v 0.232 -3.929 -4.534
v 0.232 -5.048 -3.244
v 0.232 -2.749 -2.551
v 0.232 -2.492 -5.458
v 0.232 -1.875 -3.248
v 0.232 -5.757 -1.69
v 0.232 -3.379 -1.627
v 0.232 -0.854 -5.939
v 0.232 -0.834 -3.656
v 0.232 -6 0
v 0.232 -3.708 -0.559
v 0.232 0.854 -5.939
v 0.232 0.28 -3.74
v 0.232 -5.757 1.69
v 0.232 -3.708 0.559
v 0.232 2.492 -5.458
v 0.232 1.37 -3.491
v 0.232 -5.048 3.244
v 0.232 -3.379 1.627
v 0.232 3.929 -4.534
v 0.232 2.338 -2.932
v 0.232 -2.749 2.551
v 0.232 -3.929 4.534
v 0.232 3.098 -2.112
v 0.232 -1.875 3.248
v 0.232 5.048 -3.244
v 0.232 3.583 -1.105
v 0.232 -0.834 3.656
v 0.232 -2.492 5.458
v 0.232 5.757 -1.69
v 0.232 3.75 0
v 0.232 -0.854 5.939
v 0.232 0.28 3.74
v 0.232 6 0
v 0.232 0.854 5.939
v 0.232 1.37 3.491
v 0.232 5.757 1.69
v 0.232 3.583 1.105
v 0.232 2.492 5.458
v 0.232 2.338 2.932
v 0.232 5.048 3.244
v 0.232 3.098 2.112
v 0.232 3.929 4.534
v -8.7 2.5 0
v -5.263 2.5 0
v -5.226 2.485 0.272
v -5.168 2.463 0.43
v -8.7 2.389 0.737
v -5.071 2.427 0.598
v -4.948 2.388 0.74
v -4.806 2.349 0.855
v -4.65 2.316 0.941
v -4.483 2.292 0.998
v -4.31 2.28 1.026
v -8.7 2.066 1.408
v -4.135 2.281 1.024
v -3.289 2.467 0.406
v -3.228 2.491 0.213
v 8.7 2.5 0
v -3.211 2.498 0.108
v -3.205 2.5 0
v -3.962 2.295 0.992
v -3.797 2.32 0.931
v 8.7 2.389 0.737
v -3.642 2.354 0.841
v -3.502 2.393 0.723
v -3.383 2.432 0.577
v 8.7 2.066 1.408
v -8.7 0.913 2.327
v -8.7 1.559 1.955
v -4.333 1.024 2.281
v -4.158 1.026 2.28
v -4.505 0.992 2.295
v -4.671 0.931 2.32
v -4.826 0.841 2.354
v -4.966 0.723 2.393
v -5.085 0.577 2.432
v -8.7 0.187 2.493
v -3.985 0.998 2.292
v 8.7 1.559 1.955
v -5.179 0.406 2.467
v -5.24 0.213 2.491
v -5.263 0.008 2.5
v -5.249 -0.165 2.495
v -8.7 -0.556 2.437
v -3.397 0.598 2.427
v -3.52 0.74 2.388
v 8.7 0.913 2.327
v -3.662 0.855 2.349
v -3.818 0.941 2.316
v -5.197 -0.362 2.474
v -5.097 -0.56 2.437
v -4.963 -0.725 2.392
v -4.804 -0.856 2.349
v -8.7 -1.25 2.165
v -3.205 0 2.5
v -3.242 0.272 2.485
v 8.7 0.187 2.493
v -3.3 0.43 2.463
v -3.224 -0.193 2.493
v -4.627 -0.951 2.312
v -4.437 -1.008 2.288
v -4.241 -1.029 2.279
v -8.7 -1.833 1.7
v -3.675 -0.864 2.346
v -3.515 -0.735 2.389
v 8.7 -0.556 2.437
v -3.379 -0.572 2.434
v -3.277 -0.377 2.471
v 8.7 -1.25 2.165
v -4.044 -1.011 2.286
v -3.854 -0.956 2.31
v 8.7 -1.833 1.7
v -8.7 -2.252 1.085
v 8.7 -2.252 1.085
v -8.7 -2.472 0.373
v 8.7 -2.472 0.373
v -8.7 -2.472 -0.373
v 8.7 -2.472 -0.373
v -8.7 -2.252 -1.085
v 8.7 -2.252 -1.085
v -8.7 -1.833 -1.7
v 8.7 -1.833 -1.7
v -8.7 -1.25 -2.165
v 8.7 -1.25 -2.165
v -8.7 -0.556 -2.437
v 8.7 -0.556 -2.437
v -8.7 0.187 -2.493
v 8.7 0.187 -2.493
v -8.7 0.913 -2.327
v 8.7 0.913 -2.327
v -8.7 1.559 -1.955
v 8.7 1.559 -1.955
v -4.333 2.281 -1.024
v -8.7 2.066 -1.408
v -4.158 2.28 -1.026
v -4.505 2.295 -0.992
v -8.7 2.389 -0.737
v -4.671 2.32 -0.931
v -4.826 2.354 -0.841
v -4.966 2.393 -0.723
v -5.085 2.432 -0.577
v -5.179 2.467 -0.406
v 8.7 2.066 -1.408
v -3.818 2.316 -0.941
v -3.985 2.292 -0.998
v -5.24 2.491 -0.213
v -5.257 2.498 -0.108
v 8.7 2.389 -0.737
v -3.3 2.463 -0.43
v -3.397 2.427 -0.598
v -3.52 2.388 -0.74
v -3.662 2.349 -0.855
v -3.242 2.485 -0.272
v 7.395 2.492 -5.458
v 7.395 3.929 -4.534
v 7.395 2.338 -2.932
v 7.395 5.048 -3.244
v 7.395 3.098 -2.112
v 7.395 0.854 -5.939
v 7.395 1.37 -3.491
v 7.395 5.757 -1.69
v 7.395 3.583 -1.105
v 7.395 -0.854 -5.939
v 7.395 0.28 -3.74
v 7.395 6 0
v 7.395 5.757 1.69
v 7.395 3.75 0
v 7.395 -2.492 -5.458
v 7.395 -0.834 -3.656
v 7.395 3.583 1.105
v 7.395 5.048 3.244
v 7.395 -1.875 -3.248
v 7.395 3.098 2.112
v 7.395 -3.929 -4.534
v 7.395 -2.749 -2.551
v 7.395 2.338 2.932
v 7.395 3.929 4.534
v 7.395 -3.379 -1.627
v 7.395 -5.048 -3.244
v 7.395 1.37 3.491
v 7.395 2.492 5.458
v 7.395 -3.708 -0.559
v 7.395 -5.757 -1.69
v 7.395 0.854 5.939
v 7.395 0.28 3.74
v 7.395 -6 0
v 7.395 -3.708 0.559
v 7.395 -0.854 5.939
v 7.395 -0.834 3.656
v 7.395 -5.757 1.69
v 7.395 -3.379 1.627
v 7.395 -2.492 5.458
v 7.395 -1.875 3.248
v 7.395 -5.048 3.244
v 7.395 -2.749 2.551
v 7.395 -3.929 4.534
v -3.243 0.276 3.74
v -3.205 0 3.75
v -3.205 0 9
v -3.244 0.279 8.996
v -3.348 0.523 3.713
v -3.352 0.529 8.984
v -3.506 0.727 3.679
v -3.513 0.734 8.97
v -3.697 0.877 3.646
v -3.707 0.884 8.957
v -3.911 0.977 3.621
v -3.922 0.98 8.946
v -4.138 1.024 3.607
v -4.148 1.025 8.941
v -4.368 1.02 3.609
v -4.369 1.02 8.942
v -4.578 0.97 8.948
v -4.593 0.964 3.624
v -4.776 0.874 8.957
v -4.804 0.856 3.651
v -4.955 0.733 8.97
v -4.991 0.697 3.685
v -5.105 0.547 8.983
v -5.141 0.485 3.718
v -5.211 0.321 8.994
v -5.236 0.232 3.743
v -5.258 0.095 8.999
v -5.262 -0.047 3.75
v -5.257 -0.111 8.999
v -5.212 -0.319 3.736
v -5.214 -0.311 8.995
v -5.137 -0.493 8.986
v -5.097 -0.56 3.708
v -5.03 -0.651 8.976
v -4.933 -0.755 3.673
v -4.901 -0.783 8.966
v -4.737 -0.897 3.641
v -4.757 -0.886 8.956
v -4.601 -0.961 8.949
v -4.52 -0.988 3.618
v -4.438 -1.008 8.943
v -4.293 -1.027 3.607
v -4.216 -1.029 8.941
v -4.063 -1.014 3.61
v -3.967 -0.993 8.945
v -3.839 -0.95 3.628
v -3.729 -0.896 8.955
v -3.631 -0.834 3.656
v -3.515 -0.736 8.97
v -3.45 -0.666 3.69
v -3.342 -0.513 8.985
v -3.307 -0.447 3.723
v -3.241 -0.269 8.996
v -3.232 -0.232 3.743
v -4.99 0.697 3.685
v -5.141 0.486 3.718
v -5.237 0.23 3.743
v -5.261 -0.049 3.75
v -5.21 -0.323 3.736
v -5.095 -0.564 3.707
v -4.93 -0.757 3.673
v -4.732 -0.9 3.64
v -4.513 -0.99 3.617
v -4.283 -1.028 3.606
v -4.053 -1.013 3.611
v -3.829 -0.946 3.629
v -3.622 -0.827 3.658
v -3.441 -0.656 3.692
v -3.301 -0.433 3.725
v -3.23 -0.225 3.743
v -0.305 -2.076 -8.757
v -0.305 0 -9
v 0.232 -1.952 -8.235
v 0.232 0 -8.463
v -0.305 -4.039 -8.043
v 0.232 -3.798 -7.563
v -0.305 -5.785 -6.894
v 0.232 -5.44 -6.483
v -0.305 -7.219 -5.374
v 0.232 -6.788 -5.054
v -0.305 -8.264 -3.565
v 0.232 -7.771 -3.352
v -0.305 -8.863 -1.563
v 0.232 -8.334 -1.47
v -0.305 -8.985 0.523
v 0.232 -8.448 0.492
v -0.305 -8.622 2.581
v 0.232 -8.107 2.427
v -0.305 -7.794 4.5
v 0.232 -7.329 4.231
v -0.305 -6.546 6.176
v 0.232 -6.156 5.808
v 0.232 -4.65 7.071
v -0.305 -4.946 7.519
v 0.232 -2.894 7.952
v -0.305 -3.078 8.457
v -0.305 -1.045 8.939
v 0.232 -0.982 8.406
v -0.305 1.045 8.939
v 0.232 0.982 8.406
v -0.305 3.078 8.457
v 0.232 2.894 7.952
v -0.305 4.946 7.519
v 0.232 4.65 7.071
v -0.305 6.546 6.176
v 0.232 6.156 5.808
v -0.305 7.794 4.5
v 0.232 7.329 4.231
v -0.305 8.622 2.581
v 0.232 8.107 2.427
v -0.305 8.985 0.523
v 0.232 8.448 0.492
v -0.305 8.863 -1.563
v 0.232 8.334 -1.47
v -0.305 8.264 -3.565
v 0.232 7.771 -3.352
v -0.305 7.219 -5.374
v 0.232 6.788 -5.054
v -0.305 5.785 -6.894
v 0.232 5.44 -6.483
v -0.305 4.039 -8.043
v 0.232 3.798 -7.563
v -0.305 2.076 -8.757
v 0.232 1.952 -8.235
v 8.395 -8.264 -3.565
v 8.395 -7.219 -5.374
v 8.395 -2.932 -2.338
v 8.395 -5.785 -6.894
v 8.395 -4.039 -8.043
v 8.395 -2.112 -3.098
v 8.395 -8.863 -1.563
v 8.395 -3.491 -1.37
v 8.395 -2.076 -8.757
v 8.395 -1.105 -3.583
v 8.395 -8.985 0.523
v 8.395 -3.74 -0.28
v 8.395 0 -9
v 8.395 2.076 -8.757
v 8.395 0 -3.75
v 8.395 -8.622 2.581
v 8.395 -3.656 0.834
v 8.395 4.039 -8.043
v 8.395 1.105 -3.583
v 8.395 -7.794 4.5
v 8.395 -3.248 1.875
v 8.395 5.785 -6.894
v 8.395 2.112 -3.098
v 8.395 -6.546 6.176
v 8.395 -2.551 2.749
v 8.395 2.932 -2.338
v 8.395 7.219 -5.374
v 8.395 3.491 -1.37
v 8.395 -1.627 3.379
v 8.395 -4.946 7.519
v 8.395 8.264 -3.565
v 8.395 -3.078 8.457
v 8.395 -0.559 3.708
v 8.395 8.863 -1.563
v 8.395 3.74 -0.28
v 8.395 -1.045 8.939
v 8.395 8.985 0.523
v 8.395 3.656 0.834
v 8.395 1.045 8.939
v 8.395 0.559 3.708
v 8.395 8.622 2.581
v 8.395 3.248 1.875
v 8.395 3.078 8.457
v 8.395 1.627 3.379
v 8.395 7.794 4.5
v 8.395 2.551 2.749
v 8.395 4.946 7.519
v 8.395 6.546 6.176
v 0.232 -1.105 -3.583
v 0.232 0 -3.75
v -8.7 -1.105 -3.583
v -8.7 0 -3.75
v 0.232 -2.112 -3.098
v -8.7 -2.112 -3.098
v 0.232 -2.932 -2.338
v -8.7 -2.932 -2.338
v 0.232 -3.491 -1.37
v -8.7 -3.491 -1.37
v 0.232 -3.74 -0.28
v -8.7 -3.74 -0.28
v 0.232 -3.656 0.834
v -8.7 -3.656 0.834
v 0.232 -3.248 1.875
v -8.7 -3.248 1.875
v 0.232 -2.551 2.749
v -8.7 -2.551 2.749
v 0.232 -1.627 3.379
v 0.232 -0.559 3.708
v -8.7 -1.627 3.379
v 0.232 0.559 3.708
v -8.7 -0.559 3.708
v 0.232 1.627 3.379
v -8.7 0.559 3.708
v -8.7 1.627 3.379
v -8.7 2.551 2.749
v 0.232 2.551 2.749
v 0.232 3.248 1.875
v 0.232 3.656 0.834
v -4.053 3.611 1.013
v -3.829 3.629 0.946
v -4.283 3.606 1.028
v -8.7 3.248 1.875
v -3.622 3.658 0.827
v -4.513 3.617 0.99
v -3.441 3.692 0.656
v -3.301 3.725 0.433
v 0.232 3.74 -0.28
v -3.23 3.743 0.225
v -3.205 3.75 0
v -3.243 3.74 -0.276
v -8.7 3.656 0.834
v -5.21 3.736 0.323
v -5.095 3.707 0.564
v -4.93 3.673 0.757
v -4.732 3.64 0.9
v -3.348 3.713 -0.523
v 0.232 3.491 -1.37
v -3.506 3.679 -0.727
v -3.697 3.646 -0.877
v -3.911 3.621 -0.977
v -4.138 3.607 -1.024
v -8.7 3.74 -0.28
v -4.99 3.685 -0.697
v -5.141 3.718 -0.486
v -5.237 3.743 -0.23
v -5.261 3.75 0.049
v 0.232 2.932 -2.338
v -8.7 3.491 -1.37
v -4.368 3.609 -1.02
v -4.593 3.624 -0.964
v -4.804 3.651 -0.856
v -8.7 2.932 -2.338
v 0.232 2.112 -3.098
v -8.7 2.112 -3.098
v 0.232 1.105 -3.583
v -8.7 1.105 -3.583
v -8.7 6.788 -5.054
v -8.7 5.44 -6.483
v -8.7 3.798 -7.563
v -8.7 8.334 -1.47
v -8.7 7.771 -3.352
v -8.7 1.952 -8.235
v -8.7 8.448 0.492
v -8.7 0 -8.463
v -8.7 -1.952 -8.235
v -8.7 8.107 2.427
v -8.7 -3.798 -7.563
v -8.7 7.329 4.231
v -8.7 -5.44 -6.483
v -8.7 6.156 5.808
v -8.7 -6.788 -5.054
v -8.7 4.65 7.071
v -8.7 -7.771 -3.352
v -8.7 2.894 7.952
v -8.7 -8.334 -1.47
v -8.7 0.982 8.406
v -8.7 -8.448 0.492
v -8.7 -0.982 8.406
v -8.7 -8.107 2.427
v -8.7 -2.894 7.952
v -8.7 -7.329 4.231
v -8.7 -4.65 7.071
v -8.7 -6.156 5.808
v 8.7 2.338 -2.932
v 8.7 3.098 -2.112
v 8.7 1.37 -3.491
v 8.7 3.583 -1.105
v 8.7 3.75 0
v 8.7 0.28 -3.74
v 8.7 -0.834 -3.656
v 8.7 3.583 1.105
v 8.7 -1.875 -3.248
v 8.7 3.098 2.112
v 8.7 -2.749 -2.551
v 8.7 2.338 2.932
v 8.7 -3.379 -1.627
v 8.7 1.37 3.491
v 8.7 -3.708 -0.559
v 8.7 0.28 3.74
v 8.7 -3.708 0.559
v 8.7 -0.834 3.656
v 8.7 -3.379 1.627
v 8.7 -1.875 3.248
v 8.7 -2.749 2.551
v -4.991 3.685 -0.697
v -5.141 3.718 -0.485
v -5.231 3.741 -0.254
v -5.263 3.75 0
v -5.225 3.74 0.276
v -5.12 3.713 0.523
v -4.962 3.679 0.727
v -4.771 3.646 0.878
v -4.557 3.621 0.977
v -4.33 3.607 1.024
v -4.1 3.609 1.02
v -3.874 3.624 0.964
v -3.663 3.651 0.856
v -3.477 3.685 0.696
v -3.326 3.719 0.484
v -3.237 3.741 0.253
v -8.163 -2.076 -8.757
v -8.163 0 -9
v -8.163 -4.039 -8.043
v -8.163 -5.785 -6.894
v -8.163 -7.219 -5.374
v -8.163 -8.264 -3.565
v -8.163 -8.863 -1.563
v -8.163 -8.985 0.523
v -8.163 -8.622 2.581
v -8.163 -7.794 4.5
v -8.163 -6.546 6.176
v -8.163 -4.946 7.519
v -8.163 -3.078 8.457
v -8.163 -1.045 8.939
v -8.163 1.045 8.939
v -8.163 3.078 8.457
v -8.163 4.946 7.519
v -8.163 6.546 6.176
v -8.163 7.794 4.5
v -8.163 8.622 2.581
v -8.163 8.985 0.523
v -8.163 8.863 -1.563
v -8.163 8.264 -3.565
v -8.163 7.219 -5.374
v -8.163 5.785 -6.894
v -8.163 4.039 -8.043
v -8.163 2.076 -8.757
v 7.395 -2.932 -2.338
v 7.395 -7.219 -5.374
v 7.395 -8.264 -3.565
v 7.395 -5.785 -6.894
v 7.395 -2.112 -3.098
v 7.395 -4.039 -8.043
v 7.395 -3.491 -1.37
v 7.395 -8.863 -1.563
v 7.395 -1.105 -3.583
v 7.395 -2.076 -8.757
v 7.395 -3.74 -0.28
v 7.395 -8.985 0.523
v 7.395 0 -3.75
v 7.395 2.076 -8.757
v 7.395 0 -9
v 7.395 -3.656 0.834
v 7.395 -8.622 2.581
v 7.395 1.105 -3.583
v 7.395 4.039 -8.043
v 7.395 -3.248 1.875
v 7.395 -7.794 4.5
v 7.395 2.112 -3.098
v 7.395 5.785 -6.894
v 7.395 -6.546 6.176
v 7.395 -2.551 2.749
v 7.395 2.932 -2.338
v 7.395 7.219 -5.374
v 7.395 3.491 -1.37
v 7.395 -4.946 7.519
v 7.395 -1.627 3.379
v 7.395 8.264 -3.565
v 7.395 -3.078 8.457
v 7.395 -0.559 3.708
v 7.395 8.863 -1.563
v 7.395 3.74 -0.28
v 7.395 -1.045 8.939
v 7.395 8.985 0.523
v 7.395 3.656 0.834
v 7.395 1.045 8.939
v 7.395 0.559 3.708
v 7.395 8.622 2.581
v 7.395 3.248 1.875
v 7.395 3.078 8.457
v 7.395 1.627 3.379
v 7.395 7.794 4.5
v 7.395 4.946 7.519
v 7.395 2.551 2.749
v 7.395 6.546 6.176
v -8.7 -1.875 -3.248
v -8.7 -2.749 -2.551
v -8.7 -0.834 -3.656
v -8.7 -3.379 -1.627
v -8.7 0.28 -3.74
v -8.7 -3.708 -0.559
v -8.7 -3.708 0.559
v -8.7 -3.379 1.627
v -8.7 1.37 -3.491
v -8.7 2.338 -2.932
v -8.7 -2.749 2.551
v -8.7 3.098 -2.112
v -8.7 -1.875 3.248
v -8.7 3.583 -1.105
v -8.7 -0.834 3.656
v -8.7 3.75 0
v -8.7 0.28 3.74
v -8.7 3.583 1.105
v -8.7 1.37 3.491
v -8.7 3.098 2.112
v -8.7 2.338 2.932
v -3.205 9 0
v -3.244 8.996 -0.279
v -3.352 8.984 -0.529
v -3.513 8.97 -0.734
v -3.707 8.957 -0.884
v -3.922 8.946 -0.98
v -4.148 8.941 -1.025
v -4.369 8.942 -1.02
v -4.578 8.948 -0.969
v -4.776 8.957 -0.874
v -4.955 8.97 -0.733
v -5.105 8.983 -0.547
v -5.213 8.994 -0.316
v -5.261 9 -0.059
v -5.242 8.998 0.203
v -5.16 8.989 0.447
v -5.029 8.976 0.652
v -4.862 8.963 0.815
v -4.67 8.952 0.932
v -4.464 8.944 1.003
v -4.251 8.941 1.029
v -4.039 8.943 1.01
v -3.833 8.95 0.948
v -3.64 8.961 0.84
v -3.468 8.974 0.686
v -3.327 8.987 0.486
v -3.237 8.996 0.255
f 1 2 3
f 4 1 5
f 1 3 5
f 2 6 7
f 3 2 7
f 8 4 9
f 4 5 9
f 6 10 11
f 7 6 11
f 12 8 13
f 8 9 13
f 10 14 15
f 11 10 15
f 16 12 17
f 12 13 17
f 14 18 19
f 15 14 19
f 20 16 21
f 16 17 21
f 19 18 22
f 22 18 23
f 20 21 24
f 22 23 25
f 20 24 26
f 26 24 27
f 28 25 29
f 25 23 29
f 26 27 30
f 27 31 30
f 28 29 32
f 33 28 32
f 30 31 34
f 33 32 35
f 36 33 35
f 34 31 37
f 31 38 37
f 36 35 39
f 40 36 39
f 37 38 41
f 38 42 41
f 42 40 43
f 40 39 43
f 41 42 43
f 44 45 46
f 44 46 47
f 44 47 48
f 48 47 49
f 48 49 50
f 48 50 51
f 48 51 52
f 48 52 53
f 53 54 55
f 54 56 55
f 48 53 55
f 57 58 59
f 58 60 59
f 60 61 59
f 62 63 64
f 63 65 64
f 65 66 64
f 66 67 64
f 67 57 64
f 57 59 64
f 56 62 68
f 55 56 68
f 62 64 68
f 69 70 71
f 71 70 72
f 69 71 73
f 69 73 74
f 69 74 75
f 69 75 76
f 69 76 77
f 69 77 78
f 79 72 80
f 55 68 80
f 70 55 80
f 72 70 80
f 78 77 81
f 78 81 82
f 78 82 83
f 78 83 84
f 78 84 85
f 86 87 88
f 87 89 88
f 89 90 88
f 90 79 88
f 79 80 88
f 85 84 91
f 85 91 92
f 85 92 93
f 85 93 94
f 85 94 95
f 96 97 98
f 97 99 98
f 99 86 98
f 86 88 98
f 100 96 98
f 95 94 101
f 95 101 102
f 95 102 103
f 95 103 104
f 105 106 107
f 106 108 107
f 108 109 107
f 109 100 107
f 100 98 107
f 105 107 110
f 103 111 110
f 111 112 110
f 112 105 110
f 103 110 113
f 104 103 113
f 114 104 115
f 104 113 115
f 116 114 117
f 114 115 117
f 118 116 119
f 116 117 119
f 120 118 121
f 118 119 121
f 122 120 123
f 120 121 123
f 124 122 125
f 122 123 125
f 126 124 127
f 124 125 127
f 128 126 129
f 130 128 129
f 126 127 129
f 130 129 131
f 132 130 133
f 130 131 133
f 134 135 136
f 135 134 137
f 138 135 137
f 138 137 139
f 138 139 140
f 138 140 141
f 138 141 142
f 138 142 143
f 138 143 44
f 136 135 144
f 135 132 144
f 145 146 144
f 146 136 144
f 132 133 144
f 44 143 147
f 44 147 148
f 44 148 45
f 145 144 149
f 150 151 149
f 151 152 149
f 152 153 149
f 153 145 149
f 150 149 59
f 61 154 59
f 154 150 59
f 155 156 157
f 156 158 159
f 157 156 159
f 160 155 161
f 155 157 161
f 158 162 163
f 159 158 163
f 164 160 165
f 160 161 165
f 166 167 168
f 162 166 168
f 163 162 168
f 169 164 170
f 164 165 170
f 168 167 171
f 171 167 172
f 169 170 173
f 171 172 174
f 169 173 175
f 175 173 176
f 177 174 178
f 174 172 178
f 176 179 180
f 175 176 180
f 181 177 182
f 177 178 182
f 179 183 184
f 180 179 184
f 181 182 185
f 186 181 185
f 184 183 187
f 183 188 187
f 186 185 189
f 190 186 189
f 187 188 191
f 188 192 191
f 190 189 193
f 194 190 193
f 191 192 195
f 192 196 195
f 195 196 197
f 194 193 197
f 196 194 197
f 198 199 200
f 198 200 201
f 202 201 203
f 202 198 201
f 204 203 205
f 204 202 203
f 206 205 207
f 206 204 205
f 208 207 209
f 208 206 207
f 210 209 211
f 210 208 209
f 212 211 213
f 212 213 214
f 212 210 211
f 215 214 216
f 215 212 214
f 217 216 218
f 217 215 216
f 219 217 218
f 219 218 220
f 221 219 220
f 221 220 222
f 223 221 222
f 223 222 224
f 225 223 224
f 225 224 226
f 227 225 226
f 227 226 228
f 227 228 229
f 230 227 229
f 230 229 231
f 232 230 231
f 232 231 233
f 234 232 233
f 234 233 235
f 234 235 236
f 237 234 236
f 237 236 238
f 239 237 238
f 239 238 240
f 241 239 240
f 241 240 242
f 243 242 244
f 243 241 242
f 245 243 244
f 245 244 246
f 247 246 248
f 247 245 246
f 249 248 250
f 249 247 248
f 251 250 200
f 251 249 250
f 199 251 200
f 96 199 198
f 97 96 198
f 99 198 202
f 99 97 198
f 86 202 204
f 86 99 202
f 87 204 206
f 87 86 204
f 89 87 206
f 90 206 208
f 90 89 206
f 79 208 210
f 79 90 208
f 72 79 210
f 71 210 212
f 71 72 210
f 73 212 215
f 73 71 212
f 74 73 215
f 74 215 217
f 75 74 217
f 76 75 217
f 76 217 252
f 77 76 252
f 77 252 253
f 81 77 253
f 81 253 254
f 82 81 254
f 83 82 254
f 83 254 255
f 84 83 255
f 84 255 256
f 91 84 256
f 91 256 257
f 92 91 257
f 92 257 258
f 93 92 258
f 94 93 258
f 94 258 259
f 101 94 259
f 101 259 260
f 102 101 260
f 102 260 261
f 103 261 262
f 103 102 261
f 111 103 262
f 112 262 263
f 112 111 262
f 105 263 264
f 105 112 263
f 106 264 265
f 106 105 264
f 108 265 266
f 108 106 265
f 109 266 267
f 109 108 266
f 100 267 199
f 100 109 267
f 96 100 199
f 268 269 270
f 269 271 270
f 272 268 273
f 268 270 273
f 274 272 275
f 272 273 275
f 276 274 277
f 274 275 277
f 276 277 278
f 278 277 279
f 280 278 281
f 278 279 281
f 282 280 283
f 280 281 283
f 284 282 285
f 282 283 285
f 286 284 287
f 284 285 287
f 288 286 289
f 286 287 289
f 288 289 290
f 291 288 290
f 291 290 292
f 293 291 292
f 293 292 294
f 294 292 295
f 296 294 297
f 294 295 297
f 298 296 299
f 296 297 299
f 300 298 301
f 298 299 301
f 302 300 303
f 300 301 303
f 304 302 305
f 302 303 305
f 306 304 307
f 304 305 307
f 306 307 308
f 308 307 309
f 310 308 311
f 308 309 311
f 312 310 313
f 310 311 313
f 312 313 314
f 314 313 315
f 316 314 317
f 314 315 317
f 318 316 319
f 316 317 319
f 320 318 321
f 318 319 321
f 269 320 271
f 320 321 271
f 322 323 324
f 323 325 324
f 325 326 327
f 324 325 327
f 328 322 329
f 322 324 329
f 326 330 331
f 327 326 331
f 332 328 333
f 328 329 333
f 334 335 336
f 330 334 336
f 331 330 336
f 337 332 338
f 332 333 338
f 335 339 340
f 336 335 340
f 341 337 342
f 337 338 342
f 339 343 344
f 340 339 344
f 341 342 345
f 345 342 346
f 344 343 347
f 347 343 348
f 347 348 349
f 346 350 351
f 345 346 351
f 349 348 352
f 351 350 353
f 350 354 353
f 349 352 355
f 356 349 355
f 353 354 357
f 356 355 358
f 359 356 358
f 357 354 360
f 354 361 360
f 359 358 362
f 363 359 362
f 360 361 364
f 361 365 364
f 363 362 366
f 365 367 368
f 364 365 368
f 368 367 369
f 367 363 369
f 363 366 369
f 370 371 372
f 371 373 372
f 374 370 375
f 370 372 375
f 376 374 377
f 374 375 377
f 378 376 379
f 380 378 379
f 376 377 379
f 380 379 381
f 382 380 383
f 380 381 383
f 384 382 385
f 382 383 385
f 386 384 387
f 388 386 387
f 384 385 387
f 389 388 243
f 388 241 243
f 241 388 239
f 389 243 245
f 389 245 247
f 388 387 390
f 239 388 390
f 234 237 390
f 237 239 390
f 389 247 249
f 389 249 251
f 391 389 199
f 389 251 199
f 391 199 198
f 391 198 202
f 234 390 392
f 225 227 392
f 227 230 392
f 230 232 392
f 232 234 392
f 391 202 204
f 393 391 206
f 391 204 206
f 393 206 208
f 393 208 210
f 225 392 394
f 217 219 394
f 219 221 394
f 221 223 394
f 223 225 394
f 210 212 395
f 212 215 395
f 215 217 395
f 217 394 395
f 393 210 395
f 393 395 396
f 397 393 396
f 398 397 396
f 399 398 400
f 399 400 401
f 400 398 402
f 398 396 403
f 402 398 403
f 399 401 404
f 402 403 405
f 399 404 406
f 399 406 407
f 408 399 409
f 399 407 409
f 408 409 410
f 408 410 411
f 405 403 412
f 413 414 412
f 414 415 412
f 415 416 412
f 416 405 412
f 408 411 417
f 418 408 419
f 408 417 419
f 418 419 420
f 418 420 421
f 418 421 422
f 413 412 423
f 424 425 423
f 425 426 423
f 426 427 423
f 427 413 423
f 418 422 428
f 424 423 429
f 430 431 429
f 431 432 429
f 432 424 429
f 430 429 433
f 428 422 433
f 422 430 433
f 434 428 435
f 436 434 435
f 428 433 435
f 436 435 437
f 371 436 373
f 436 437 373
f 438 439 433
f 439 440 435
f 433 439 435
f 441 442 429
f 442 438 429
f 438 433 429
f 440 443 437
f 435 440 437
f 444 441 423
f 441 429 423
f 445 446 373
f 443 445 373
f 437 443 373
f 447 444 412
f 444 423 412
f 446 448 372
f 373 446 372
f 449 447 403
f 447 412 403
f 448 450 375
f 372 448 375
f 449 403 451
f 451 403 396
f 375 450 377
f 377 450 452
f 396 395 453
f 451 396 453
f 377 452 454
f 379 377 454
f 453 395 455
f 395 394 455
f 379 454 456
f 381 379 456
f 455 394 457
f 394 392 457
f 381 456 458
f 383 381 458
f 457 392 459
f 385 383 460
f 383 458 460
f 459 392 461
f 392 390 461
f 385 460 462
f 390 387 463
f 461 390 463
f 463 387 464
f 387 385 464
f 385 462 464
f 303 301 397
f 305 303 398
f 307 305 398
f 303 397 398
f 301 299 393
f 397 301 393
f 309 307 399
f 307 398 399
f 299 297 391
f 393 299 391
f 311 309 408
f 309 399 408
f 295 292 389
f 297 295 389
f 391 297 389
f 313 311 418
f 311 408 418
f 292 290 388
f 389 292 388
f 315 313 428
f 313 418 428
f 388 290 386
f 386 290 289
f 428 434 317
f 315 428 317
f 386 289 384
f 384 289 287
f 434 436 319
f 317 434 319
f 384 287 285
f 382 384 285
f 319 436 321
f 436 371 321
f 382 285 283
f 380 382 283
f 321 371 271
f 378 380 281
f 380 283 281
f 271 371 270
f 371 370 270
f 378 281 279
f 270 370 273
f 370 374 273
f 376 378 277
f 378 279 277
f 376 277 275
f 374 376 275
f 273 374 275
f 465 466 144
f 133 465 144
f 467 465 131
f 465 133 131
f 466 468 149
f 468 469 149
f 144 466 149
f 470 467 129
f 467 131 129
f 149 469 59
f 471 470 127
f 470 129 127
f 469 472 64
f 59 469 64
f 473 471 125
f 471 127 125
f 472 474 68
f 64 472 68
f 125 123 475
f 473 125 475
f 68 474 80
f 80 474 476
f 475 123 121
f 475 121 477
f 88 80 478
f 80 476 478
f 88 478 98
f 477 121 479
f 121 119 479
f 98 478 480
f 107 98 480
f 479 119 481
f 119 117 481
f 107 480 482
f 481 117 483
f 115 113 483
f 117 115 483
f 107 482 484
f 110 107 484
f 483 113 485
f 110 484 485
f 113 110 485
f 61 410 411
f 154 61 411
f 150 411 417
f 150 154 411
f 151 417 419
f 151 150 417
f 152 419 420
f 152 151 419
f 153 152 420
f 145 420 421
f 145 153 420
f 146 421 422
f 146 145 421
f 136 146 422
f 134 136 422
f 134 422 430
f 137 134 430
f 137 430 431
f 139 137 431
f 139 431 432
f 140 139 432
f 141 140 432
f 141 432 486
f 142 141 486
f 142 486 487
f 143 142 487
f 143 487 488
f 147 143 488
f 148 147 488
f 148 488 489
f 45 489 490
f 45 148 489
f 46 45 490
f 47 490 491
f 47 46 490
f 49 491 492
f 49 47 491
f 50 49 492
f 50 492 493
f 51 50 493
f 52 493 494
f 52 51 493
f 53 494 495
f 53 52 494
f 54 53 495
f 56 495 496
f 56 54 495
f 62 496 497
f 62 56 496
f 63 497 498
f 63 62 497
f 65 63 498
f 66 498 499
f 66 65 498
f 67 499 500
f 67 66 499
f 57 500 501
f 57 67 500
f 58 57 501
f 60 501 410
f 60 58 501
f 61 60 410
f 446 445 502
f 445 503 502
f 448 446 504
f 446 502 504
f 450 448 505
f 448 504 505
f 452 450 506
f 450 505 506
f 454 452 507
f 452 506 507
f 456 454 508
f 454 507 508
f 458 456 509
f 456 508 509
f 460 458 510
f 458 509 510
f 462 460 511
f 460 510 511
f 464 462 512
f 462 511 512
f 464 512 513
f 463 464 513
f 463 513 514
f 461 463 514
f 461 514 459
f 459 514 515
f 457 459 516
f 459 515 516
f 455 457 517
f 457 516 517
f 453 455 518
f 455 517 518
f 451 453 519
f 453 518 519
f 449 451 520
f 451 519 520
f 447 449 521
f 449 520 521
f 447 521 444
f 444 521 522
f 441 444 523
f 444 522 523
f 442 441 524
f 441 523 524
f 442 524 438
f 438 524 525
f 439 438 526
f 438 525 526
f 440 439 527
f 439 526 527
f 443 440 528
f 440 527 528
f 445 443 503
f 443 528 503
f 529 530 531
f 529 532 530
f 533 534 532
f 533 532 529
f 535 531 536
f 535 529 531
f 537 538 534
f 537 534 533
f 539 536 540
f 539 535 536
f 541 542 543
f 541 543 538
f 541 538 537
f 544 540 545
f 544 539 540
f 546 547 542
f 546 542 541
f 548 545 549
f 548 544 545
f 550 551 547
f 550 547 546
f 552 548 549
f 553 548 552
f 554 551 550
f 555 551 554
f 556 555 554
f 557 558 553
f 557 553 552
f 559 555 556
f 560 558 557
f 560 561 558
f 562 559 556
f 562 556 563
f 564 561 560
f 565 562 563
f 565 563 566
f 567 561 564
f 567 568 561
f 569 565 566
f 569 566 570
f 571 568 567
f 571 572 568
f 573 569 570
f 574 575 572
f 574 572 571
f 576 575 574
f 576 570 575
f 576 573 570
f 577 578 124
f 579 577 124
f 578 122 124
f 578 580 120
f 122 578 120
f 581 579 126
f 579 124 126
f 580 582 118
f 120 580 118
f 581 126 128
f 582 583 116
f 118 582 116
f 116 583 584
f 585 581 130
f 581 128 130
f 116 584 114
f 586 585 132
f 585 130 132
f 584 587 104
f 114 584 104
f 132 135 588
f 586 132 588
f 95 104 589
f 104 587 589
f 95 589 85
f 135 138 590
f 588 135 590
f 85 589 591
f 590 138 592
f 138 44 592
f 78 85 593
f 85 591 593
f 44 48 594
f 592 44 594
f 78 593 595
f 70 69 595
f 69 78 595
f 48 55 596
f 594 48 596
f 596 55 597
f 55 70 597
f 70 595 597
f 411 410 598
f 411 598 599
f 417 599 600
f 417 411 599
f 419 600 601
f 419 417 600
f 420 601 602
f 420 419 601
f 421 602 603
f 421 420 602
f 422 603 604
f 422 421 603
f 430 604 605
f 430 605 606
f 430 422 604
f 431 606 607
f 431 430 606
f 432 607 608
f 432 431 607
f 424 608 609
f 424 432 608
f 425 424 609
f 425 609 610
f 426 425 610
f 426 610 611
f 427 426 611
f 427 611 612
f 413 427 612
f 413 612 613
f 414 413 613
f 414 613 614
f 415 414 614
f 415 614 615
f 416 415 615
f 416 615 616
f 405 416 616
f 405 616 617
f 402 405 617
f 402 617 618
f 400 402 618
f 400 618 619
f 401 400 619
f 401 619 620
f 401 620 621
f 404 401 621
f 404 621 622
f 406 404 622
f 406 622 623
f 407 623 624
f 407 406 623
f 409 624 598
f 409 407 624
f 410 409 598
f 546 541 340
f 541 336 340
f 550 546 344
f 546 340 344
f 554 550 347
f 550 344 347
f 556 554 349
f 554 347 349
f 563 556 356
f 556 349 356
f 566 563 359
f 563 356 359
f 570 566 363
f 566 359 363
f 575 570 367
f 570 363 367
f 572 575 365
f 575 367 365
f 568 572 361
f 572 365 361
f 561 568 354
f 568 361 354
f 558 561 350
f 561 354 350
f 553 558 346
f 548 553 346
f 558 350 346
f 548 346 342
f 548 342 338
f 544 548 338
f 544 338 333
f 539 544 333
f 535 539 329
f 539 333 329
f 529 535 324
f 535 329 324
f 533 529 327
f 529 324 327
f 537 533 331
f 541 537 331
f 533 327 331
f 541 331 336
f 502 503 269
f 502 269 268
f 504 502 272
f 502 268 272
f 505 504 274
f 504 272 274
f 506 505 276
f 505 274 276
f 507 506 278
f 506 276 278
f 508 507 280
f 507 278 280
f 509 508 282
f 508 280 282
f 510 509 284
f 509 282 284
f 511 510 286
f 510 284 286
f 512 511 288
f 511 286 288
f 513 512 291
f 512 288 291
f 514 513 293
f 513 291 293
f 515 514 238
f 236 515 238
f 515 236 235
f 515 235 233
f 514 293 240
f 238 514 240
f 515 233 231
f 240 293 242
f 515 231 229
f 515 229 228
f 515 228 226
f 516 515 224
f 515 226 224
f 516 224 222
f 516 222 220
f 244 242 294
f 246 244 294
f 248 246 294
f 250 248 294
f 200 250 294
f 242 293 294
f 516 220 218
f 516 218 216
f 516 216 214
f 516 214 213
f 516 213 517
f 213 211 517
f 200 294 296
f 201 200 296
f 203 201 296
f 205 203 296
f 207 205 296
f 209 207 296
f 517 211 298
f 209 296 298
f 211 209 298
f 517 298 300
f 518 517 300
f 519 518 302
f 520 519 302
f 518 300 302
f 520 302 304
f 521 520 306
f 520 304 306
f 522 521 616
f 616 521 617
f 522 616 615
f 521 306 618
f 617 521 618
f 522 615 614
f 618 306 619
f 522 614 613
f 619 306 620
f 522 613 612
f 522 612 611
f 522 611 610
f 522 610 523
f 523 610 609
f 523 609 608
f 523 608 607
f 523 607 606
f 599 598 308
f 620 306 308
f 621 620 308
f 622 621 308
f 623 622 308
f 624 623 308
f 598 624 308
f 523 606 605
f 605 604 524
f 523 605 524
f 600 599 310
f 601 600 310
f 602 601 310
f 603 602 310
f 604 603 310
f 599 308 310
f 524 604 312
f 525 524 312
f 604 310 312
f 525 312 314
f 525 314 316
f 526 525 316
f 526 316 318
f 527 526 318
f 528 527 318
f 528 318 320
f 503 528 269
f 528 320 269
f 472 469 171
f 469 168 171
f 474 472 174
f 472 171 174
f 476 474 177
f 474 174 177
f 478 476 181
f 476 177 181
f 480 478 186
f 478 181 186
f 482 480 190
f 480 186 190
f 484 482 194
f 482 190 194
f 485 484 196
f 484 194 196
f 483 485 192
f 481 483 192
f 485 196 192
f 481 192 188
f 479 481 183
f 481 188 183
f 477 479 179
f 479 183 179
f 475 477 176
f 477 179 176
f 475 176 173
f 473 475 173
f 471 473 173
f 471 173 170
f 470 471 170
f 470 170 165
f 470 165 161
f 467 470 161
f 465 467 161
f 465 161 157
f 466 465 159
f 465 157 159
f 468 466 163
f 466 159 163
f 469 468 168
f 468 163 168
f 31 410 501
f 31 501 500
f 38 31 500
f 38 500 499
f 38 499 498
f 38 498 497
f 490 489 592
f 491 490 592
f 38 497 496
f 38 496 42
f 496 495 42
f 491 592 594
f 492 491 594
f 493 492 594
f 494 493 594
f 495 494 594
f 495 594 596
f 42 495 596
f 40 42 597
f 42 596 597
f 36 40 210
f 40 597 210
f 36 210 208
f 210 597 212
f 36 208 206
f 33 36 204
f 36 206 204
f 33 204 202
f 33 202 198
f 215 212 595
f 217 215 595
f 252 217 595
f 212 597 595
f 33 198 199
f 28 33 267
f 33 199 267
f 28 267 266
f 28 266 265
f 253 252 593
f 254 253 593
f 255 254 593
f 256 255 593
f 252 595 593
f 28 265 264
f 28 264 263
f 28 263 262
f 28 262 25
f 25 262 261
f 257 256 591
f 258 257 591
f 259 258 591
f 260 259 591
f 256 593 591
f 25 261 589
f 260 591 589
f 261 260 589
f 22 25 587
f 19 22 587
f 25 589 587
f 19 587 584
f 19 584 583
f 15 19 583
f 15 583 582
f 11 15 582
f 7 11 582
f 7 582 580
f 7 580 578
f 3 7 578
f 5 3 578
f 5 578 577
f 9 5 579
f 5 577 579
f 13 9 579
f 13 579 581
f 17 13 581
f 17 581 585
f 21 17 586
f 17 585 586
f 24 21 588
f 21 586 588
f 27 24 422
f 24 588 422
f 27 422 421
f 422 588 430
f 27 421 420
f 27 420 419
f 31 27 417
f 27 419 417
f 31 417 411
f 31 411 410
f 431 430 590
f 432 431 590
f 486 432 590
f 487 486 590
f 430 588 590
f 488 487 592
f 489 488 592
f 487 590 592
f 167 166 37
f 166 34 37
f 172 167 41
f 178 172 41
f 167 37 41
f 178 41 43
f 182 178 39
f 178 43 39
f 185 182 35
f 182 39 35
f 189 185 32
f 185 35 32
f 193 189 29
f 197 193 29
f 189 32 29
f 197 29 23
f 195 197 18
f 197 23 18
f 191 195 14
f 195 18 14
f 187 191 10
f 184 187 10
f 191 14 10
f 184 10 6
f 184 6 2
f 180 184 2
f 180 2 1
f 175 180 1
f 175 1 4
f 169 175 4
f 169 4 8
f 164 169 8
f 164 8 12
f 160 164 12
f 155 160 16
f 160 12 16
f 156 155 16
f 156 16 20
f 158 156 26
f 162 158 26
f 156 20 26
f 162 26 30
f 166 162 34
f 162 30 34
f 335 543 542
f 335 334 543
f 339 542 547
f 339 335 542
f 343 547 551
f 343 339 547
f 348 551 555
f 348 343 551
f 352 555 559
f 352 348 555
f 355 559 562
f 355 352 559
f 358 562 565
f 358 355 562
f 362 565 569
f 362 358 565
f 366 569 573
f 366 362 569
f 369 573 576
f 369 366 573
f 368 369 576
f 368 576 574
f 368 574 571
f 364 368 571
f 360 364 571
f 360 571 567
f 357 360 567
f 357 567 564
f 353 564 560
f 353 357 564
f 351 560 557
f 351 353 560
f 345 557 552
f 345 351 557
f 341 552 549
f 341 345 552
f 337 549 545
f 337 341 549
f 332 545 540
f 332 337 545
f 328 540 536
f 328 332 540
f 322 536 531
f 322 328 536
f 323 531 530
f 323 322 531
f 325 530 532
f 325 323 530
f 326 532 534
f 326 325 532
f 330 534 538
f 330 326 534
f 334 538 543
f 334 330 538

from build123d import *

# Parameters (mm, degrees)
SKETCH4_W         = 1
SKETCH4_H         = 5.25
SKETCH5_R         = 1.0287
SET_SCREWS_DEPTH  = 10
CIRPATTERN1_COUNT = 2
CIRPATTERN1_ANGLE = 90


with BuildPart() as part:
    # Sketch2 → Base Body (revolve)
    with BuildSketch(Plane.XY):
        Polygon((-8.7, 2.5), (8.7, 2.5), (8.7, 3.75), (7.395, 3.75), (7.395, 6), (0.2322, 6), (0.2322, 3.75), (-8.7, 3.75), align=None)
    revolve(axis=Axis((-7.1374, 0, 0), (1, 0, 0)))


with BuildPart() as body_2:
    # Sketch3 → Hub (revolve)
    with BuildSketch(Plane(origin=(0, 0, 0), x_dir=(1, 0, 0), z_dir=(0, 1, 0))):
        Polygon((0.2322, 3.75), (-8.7, 3.75), (-8.7, 8.46279), (-8.16279, 9), (-0.30501, 9), (0.2322, 8.46279), align=None)
    revolve(axis=Axis((0, 0, 0), (-1, 0, 0)))


with BuildPart() as body_3:
    # Sketch4 → Flange (revolve)
    with BuildSketch(Plane(origin=(0, 0, 0), x_dir=(1, 0, 0), z_dir=(0, 1, 0))):
        with Locations((7.895, 6.375)):
            Rectangle(SKETCH4_W, SKETCH4_H)
    revolve(axis=Axis((0, 0, 0), (1, 0, 0)))


with BuildPart() as set_screws_tool:
    # Sketch5 → Set Screws (new body)
    with BuildSketch(Plane(origin=(0, 0, 0), x_dir=(1, 0, 0), z_dir=(0, 1, 0))):
        with Locations((-4.2339, 0)):
            Circle(SKETCH5_R)
    set_screws = extrude(amount=SET_SCREWS_DEPTH)


with BuildPart() as part_1:
    add(part.part)

    # Set Screws: cut by set_screws_tool
    add(set_screws_tool.part, mode=Mode.SUBTRACT)


with BuildPart() as body_2_1:
    add(body_2.part)

    # Set Screws: cut by set_screws_tool
    add(set_screws_tool.part, mode=Mode.SUBTRACT)


with BuildPart() as cirpattern1_tool:
    # CirPattern1: Set Screws ×2 about axis
    cirpattern1_axis = Axis((-7.1374, 0, 0), (1, 0, 0))
    for i in range(1, CIRPATTERN1_COUNT):
        add(set_screws.rotate(cirpattern1_axis, i * CIRPATTERN1_ANGLE / (CIRPATTERN1_COUNT - 1)))


with BuildPart() as part_2:
    add(part_1.part)

    # CirPattern1: cut by cirpattern1_tool
    add(cirpattern1_tool.part, mode=Mode.SUBTRACT)


with BuildPart() as body_2_2:
    add(body_2_1.part)

    # CirPattern1: cut by cirpattern1_tool
    add(cirpattern1_tool.part, mode=Mode.SUBTRACT)


solid = Compound([body_3.part, part_2.part, body_2_2.part])
